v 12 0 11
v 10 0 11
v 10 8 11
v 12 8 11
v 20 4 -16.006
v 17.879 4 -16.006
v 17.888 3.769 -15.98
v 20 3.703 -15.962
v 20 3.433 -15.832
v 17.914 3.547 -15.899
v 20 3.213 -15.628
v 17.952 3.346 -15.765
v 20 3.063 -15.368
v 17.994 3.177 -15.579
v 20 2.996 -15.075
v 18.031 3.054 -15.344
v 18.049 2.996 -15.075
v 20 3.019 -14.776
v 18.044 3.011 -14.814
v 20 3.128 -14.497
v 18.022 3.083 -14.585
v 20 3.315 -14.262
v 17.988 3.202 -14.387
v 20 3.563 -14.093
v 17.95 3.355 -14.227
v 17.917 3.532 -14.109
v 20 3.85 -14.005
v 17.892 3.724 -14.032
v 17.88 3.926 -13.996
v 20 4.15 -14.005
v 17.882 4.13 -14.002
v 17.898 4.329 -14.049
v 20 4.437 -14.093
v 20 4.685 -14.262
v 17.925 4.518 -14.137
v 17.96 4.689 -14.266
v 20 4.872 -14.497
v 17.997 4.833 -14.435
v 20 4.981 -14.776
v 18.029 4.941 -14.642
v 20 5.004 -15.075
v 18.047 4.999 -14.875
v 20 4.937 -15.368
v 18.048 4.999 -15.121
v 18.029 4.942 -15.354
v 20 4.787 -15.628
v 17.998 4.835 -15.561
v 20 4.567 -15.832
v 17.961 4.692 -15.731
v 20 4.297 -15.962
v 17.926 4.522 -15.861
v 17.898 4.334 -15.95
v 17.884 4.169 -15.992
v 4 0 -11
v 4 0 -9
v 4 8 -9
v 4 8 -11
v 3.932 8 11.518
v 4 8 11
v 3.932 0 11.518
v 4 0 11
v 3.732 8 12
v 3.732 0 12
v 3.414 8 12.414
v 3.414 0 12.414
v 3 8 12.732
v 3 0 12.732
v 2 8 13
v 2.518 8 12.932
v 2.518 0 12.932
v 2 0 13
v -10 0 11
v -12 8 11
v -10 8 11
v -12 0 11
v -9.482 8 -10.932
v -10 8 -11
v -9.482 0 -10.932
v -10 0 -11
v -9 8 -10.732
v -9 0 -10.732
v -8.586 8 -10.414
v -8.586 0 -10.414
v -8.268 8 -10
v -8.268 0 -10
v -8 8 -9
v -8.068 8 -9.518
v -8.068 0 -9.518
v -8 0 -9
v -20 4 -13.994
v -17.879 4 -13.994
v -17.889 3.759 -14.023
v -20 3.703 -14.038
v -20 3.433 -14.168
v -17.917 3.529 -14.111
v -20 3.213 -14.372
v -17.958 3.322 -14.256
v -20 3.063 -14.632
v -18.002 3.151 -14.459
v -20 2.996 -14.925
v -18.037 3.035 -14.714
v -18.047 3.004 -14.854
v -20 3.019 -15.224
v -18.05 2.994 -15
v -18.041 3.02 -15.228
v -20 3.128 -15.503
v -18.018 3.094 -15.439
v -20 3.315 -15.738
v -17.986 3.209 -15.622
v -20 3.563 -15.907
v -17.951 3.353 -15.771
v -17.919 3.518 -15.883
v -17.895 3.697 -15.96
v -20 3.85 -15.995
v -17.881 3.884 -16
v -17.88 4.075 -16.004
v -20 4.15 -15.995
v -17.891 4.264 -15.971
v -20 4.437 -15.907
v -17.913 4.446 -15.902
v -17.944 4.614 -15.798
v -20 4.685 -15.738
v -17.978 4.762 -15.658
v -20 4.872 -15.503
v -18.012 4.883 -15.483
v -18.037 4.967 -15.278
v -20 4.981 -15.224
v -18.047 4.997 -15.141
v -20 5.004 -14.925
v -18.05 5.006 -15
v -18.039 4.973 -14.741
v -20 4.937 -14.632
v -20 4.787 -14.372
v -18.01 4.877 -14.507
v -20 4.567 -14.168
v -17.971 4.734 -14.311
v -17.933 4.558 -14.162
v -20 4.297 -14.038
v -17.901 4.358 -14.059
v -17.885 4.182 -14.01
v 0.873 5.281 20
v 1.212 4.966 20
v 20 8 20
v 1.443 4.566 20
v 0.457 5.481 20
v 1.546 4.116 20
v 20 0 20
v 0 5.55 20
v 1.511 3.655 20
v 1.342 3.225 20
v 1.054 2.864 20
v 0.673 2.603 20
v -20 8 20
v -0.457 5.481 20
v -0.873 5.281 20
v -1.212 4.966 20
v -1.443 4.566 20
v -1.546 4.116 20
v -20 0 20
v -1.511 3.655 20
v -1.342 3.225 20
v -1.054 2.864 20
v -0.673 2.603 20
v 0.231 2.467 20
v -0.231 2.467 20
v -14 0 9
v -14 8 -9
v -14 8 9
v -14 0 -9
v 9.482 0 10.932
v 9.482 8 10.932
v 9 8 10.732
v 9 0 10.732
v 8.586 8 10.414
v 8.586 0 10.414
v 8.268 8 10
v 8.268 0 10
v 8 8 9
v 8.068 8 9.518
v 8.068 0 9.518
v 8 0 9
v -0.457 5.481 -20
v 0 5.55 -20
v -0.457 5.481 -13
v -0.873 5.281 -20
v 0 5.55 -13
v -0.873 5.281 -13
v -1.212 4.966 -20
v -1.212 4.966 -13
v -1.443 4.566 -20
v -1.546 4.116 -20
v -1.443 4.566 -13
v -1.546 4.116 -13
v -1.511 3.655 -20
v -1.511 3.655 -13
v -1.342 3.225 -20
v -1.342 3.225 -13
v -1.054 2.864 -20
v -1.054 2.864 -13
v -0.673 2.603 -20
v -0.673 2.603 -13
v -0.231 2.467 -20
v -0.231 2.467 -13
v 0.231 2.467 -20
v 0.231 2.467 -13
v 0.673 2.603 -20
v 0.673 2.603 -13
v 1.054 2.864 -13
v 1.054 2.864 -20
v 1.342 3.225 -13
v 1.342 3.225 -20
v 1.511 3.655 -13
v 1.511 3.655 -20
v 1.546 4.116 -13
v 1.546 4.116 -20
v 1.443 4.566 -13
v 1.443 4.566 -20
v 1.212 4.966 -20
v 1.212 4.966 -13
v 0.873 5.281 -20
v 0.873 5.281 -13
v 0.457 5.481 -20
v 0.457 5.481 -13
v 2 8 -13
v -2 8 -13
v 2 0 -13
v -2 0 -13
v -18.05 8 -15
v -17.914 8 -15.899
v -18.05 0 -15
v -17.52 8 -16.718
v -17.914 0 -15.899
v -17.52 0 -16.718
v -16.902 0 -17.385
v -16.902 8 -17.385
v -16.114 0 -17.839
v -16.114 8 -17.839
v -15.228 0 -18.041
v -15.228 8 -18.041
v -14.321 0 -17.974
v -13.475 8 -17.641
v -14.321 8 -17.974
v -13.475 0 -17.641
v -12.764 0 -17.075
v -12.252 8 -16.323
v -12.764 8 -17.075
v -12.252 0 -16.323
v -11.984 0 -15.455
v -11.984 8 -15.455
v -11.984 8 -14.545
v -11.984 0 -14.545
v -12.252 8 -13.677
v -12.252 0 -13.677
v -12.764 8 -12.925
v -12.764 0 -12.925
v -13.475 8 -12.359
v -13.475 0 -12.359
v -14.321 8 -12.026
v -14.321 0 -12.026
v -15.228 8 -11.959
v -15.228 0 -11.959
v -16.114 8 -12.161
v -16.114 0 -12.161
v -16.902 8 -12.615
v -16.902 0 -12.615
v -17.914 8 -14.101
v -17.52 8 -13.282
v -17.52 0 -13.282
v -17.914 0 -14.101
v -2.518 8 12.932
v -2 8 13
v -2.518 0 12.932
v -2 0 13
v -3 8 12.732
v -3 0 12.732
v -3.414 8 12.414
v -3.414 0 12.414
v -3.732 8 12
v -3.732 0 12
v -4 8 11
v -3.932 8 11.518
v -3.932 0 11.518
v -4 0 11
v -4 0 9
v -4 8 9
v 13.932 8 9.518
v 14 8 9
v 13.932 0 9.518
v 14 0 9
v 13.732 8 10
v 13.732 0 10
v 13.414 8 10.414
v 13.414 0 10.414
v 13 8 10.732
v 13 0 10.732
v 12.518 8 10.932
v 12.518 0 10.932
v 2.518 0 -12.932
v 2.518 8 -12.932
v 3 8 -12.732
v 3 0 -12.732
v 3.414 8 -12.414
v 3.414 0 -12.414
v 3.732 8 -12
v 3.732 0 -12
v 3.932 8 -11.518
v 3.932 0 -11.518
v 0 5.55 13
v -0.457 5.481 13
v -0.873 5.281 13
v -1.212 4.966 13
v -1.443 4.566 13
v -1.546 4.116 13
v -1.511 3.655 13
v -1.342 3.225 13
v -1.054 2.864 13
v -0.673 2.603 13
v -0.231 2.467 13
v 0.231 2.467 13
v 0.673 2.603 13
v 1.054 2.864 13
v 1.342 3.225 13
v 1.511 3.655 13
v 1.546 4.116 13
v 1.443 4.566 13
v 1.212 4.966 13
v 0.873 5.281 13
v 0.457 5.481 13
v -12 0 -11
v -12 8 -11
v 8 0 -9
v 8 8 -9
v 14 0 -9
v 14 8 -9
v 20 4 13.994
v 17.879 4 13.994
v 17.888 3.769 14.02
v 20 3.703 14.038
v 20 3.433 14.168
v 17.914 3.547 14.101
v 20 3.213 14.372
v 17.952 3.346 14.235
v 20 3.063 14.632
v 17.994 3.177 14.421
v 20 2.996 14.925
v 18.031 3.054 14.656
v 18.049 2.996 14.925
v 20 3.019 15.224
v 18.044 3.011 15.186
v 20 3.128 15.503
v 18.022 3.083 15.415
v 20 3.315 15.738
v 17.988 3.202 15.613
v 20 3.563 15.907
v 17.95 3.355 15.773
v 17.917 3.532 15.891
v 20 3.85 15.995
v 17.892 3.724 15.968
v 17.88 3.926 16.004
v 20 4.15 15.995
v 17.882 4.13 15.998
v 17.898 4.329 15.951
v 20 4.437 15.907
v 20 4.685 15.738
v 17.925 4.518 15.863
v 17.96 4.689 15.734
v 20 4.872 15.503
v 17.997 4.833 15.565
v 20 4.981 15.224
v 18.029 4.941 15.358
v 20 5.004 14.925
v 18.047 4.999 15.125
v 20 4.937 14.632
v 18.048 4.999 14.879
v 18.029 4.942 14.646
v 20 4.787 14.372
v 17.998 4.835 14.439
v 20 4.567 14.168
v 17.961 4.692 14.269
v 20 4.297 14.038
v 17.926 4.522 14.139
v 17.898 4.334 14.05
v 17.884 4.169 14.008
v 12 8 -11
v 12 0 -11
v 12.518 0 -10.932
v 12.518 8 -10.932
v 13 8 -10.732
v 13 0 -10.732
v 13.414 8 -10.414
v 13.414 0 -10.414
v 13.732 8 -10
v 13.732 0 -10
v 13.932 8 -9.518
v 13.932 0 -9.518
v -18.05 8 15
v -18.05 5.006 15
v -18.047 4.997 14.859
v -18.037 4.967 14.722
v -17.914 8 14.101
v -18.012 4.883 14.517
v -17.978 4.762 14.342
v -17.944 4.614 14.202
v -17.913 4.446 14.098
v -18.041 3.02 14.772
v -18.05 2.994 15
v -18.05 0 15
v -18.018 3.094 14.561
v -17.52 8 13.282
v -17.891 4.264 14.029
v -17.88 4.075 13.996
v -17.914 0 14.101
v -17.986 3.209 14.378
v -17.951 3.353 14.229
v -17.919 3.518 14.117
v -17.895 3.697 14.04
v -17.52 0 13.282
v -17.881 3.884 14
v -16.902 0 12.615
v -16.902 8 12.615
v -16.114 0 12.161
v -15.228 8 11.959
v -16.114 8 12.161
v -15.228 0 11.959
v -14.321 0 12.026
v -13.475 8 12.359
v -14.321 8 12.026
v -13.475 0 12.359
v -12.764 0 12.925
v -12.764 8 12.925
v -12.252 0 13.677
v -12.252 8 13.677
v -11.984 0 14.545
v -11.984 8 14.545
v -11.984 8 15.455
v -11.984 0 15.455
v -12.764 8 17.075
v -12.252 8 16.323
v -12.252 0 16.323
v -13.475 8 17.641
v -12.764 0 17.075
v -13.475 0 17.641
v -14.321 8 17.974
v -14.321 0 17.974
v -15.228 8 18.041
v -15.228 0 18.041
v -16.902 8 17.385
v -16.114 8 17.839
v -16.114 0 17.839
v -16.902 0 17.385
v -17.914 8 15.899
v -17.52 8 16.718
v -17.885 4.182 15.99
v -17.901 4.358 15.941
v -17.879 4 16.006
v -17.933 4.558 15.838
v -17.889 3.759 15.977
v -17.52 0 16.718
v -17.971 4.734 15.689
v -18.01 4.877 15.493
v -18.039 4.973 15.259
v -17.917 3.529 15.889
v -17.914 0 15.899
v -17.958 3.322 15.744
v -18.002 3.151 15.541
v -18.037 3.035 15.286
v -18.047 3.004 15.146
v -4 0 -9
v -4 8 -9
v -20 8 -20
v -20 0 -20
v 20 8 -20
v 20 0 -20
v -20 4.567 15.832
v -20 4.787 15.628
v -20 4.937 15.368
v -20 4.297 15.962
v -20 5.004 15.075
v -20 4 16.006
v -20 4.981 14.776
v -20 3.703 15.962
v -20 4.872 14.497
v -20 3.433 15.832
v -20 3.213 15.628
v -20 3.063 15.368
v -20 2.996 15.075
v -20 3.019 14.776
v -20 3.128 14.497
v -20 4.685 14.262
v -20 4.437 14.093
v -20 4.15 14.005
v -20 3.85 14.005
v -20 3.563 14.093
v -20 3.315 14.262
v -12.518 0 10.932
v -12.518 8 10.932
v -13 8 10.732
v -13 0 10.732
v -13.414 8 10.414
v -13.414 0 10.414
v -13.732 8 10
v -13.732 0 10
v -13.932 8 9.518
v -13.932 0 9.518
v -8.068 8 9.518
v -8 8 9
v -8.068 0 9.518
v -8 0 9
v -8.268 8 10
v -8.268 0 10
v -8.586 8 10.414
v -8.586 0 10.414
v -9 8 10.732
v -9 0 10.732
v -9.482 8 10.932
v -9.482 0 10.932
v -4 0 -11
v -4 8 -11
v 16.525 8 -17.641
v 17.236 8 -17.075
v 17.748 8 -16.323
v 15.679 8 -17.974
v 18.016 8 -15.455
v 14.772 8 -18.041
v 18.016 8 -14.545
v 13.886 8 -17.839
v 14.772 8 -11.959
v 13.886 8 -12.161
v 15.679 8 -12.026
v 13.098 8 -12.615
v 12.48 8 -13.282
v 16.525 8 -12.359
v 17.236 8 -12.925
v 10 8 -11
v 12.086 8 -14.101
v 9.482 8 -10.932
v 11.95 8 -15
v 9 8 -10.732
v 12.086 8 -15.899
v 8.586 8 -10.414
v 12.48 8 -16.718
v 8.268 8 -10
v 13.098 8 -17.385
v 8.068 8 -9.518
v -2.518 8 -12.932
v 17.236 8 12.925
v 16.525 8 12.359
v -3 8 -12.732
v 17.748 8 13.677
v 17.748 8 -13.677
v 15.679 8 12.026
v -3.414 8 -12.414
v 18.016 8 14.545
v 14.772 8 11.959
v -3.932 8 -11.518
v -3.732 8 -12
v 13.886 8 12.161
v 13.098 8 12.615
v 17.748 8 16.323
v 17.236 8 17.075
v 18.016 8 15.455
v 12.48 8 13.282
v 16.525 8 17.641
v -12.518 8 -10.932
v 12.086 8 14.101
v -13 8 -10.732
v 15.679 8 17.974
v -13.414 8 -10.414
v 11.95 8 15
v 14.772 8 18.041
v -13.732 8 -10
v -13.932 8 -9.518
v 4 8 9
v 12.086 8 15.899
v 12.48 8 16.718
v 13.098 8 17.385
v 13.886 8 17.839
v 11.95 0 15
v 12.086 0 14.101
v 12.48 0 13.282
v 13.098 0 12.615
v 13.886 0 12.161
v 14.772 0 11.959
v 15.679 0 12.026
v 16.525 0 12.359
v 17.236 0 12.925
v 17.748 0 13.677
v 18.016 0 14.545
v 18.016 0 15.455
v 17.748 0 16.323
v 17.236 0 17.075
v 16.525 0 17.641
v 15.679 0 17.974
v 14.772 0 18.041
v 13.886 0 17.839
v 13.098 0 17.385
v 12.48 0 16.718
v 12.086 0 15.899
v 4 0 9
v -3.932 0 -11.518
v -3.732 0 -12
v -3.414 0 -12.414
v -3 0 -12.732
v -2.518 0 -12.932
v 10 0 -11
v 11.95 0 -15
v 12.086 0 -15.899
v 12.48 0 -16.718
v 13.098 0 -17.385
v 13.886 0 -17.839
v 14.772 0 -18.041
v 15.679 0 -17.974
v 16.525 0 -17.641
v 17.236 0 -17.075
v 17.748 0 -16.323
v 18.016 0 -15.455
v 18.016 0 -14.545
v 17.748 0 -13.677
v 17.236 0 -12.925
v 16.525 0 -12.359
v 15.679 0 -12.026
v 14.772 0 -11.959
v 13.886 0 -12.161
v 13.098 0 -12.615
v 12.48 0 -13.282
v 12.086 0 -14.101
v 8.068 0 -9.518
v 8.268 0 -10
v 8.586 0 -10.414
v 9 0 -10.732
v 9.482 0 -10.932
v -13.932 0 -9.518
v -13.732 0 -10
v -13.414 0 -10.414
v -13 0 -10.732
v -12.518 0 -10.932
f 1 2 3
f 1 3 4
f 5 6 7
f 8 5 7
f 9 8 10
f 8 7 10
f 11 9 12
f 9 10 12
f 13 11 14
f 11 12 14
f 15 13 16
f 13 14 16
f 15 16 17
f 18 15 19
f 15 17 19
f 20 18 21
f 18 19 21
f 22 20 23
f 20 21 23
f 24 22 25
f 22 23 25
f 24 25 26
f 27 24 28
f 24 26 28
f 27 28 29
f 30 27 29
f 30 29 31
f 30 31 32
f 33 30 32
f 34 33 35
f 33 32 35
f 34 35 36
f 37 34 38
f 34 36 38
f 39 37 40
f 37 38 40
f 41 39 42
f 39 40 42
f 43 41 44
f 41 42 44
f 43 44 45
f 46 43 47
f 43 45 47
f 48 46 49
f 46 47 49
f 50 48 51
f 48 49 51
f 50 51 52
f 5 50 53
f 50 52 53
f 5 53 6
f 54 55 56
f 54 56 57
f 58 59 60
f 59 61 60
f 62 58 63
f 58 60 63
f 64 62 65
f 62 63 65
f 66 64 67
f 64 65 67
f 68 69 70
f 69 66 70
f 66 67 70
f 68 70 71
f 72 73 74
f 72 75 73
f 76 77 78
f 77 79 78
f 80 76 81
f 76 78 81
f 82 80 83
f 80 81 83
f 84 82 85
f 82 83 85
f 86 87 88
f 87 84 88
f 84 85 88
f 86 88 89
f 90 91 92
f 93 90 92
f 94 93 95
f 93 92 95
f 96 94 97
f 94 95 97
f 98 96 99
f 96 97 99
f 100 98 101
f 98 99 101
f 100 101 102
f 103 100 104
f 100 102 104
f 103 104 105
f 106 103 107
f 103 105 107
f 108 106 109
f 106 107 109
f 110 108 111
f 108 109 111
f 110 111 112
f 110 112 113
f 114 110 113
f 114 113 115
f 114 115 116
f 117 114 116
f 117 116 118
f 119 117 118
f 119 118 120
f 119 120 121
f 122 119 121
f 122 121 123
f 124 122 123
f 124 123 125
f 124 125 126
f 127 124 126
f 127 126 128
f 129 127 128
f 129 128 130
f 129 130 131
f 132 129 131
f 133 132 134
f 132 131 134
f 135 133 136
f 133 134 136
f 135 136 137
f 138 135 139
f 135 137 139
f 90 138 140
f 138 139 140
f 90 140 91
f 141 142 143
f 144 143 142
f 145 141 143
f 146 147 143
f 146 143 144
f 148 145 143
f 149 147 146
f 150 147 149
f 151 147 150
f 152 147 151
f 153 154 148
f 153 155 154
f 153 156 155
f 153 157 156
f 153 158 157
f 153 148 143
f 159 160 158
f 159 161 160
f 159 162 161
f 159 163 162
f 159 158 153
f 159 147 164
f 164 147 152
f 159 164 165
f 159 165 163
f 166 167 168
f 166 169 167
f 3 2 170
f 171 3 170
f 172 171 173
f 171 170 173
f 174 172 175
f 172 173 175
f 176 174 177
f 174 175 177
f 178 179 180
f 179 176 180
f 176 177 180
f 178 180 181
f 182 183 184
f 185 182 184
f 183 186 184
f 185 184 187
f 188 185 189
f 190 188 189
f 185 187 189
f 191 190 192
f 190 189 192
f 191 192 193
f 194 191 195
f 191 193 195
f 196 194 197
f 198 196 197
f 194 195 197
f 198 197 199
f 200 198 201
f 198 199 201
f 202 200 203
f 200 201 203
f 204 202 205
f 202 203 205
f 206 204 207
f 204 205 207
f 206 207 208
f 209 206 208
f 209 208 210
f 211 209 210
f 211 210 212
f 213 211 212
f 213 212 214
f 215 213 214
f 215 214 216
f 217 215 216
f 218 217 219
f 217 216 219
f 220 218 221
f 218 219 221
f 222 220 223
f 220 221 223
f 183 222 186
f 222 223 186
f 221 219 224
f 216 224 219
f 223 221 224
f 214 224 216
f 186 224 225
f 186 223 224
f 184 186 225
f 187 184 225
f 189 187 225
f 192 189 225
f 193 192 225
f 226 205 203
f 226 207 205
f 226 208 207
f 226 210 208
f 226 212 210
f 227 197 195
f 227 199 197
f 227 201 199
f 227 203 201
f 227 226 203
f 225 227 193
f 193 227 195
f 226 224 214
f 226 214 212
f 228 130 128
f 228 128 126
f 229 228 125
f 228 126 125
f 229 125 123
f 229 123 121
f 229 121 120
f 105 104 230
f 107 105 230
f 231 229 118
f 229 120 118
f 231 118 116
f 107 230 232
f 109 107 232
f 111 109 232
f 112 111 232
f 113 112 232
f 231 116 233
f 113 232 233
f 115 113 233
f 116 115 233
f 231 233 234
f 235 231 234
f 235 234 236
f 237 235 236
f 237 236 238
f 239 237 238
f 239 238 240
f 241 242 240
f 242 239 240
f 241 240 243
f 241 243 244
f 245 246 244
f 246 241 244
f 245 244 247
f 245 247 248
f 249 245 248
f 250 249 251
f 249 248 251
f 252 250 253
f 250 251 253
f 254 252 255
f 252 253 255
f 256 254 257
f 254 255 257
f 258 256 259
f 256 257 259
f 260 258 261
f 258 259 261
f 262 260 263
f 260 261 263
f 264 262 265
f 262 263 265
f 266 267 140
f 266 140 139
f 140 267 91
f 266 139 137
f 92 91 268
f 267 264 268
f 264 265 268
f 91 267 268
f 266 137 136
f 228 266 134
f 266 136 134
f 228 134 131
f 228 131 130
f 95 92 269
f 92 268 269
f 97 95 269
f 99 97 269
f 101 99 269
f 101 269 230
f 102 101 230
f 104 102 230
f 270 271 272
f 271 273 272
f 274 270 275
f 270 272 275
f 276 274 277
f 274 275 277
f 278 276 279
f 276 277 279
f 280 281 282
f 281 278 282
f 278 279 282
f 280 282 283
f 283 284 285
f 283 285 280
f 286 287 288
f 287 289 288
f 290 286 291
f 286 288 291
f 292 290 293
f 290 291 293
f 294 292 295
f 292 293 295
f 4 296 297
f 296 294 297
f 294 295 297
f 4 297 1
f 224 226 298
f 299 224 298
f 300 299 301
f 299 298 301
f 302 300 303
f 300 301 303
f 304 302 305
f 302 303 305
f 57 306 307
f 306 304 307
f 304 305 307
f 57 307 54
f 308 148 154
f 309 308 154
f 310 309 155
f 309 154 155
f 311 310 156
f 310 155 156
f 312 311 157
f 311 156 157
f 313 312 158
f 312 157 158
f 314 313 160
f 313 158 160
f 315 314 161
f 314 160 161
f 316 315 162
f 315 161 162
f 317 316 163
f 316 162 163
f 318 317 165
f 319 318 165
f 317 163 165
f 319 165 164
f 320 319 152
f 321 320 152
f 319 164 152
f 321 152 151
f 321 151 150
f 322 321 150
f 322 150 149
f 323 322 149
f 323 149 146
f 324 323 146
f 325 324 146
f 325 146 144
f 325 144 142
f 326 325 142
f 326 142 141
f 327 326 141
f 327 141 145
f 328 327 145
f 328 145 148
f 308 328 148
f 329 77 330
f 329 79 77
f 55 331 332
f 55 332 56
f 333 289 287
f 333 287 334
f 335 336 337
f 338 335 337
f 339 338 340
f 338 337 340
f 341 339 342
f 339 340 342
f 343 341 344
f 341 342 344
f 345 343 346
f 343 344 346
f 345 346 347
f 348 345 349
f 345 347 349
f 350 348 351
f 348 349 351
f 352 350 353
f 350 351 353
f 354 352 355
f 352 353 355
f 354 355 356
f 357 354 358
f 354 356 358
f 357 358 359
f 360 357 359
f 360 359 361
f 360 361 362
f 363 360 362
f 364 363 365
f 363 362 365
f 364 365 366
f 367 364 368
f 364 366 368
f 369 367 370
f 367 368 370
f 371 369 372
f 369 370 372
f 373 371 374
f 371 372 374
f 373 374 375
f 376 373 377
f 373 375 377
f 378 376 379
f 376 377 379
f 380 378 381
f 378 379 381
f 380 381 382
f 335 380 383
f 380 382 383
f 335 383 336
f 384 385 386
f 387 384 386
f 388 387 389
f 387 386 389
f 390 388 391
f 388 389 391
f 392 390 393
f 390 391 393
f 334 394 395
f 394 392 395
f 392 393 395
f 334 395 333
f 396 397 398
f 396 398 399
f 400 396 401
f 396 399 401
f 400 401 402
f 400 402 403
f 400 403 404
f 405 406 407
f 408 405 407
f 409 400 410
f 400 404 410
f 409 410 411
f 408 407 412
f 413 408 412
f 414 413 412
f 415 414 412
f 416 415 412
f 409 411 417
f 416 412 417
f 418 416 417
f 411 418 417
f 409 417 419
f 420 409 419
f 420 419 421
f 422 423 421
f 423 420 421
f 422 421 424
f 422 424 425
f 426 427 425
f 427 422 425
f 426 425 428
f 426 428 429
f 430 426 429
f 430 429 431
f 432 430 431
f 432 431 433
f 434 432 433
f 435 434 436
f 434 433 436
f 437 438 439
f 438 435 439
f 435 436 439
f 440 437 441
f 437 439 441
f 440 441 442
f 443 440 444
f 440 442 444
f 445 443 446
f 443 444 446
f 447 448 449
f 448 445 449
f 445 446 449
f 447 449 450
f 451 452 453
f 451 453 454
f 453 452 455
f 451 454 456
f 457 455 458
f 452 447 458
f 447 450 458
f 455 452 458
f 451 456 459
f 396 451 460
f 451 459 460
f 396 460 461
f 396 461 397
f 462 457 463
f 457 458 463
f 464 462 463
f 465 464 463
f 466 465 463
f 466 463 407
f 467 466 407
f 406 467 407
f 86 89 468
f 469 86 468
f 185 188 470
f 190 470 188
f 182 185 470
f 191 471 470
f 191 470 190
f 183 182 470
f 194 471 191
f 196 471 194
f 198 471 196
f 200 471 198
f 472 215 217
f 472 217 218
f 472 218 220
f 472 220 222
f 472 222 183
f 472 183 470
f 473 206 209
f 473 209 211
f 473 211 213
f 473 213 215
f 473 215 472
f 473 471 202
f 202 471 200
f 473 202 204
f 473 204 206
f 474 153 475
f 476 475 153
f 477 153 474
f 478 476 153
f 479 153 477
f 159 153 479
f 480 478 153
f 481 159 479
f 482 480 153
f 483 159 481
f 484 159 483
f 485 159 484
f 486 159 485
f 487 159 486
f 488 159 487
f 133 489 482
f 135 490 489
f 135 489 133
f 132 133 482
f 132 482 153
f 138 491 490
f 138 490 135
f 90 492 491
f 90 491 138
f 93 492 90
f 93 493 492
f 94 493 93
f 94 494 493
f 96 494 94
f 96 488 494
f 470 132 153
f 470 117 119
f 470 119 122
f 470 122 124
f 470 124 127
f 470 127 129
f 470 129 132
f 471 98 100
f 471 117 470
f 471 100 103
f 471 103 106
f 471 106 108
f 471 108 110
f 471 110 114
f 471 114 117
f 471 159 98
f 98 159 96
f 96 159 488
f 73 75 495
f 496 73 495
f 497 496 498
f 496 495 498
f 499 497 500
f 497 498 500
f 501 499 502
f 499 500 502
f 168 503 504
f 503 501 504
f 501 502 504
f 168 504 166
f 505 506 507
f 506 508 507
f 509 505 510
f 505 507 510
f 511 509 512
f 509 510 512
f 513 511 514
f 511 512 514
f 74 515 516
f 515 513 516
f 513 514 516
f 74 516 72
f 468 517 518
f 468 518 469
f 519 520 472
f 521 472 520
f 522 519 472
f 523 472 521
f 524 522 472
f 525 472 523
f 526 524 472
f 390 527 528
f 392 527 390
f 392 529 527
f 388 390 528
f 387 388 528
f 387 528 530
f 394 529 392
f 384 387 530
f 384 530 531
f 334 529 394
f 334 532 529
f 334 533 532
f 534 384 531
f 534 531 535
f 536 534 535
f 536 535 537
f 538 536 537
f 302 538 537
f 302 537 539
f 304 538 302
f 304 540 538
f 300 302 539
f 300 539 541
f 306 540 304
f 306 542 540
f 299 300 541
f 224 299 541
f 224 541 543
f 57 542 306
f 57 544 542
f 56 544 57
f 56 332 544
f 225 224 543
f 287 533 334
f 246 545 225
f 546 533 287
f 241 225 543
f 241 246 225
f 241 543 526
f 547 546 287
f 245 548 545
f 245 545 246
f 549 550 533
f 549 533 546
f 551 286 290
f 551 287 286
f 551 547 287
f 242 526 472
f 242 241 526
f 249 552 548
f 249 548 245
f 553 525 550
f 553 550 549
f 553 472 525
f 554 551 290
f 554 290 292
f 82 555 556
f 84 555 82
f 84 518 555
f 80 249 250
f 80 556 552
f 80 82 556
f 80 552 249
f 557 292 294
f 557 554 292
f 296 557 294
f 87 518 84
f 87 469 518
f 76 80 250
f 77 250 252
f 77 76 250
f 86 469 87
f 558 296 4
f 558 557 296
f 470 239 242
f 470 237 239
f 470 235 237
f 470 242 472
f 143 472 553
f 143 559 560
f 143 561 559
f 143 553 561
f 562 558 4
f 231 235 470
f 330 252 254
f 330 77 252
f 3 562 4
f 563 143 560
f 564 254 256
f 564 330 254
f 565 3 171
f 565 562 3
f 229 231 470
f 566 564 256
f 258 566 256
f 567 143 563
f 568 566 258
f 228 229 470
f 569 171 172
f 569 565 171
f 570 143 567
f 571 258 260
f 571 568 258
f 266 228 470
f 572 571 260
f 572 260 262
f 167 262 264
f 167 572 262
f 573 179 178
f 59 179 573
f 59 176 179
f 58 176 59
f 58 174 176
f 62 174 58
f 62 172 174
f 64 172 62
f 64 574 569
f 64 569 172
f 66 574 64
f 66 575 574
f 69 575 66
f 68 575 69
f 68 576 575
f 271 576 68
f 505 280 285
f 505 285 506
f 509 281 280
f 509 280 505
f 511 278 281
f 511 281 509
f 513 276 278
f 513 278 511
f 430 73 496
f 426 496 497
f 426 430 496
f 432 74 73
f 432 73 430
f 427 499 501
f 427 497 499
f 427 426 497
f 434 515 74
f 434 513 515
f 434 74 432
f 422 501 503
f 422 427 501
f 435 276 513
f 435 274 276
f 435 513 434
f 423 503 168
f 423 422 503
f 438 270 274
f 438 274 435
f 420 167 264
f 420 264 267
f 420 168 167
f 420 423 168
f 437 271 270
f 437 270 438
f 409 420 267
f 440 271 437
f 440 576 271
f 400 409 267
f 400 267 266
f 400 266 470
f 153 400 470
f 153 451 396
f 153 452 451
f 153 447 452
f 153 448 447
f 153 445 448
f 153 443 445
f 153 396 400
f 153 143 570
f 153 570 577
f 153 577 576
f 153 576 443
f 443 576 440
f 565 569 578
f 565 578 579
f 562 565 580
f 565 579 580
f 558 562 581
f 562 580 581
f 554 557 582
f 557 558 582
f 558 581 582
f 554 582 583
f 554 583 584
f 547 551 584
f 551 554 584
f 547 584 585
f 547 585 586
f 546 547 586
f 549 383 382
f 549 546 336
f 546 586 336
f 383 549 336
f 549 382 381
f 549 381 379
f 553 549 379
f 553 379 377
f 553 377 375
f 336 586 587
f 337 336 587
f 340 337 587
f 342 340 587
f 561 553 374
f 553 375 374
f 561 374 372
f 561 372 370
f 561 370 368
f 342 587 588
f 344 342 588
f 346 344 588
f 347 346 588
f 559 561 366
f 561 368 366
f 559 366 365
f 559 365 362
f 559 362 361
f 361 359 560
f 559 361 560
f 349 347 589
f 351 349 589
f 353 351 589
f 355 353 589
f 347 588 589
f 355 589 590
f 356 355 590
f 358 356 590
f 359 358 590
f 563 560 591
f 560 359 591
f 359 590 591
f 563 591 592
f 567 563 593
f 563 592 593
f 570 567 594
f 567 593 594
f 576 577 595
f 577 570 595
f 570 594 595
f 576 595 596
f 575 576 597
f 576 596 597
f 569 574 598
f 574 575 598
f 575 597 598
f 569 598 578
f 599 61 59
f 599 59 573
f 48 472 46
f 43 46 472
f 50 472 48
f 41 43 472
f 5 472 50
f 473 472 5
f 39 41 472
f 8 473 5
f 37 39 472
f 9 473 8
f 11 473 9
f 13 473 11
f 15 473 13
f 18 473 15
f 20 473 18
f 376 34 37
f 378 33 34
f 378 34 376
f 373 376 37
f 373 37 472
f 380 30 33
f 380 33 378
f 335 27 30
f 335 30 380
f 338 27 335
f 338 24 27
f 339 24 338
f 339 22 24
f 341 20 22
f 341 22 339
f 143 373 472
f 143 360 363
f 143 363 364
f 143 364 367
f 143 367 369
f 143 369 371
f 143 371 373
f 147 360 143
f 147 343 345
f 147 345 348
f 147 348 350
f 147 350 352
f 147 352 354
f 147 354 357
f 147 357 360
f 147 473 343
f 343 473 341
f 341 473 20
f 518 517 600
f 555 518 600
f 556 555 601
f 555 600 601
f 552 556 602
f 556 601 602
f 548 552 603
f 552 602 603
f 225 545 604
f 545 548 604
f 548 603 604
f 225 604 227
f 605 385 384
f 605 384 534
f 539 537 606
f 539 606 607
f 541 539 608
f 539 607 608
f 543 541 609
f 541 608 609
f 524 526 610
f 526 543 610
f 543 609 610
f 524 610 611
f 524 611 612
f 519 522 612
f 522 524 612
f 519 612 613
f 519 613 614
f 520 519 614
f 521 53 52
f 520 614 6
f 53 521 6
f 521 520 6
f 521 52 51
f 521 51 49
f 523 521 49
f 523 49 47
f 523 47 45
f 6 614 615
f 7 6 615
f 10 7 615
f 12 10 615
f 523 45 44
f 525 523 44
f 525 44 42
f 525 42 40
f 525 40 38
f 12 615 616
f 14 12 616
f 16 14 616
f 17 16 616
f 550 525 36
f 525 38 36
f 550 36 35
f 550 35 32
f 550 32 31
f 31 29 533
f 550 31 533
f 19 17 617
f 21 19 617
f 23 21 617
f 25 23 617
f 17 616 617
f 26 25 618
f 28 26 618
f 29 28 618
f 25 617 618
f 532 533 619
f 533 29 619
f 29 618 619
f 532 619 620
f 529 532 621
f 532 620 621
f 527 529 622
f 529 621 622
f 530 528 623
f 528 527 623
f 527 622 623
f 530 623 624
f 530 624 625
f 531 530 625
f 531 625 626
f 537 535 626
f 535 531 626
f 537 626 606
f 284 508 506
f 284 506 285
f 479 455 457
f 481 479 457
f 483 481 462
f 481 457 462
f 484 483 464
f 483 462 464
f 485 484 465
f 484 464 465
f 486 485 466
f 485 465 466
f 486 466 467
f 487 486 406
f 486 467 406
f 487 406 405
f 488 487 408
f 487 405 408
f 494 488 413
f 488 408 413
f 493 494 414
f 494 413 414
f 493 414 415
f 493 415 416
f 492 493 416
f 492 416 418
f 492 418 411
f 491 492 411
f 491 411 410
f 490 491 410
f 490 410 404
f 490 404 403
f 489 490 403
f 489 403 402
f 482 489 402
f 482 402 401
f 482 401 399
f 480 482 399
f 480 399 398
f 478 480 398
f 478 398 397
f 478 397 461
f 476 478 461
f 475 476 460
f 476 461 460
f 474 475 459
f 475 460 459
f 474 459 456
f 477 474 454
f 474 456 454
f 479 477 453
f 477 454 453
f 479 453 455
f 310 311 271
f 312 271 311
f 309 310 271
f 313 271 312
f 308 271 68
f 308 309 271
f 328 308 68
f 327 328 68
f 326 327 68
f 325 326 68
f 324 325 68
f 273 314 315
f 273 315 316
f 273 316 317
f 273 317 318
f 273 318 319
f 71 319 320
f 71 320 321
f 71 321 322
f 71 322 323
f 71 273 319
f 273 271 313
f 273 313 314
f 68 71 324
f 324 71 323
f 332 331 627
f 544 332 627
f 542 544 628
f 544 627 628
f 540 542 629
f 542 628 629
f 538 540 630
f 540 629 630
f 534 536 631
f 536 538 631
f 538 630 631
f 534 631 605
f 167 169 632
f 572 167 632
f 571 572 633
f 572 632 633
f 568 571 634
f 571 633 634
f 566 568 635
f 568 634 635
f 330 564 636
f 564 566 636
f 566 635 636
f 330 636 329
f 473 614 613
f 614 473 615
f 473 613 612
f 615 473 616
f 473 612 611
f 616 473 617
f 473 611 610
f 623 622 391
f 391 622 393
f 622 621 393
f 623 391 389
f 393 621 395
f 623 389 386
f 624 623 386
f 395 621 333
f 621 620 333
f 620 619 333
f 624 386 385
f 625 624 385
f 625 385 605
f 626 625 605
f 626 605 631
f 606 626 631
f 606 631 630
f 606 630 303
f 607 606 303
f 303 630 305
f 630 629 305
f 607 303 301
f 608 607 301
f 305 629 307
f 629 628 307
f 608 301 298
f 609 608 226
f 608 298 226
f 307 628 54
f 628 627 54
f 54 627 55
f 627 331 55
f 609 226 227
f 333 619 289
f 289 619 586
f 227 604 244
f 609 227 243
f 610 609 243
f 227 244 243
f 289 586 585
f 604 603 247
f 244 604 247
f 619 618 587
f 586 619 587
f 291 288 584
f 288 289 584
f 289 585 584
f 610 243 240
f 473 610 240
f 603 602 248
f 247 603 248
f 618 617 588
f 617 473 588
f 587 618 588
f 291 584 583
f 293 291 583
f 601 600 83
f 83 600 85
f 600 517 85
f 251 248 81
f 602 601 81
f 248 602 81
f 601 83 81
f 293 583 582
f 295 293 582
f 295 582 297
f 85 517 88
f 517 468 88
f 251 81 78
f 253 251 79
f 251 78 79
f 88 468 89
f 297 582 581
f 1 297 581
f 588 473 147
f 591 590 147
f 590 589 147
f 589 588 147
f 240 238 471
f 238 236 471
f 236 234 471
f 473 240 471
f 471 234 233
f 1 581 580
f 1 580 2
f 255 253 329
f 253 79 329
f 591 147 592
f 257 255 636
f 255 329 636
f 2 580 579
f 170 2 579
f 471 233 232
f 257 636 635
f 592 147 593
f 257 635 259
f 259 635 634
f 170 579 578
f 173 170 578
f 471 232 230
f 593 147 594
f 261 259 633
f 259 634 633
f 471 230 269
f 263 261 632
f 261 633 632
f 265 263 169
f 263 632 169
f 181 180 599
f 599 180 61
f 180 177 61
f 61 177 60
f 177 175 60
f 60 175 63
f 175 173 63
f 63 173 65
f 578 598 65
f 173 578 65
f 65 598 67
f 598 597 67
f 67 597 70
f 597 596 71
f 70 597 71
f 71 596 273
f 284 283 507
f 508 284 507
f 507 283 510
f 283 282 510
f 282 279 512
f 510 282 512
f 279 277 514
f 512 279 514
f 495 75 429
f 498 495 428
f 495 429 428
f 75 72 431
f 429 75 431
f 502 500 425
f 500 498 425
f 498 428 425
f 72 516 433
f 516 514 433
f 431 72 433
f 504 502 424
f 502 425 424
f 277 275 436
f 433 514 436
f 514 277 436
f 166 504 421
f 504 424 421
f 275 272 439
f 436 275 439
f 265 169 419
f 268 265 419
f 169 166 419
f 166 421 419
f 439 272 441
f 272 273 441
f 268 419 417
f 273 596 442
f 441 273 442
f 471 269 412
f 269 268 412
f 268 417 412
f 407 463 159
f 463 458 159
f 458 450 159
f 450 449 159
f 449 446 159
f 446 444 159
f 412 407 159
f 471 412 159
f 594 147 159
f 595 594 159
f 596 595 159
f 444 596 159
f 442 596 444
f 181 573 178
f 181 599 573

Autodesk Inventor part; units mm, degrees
ref_plane "YZ Plane" through (0, 0, 0) normal (1, 0, 0) x (0, 1, 0)
ref_plane "XZ Plane" through (0, 0, 0) normal (0, 1, 0) x (-1, 0, 0)
ref_plane "XY Plane" through (0, 0, 0) normal (0, 0, 1) x (1, 0, 0)
sketch "Sketch1" plane through (0, 0, 0) normal (0, 1, 0) x (-1, 0, 0)
  line L0 (20, 20) -> (20, -20)
  line L1 (20, -20) -> (-20, -20)
  line L2 (-20, -20) -> (-20, 20)
  line L3 (-20, 20) -> (20, 20)
  line L4 (-15, 15) -> (-15, -15) construction
  line L5 (-15, -15) -> (15, -15) construction
  line L6 (15, -15) -> (15, 15) construction
  line L7 (15, 15) -> (-15, 15) construction
  circle A0 centre (15, 15) radius 3.05
  circle A1 centre (15, -15) radius 3.05
  circle A2 centre (-15, -15) radius 3.05
  circle A3 centre (-15, 15) radius 3.05
  line L8 (0, 0) -> (-18.5703, 0) construction
  line L9 (-8, 9) -> (-8, 9)
  line L10 (-10, 11) -> (-12, 11)
  line L11 (-14, 9) -> (-14, -9)
  line L12 (-12, -11) -> (-10, -11)
  line L13 (-8, -9) -> (-8, -9)
  line L14 (8, -9) -> (8, -9)
  line L15 (10, -11) -> (12, -11)
  line L16 (14, -9) -> (14, 9)
  line L17 (12, 11) -> (10, 11)
  line L18 (8, 9) -> (8, 9)
  line L19 (0, 0) -> (0, 18.05) construction
  line L20 (0, 0) -> (-18.05, 0) construction
  arc A4 (-12, 11) -> (-14, 9) centre (-12, 9) ccw
  arc A5 (-8, 9) -> (-10, 11) centre (-10, 9) ccw
  arc A6 (-10, -11) -> (-8, -9) centre (-10, -9) ccw
  arc A7 (-14, -9) -> (-12, -11) centre (-12, -9) ccw
  arc A8 (8, -9) -> (10, -11) centre (10, -9) ccw
  arc A9 (12, -11) -> (14, -9) centre (12, -9) ccw
  arc A10 (14, 9) -> (12, 11) centre (12, 9) ccw
  arc A11 (10, 11) -> (8, 9) centre (10, 9) ccw
  line L21 (8, 9) -> (4, 9)
  line L22 (4, 9) -> (4, 11)
  line L23 (2, 13) -> (-2, 13)
  line L24 (-4, 11) -> (-4, 9)
  line L25 (-4, 9) -> (-8, 9)
  line L26 (-8, -9) -> (-4, -9)
  line L27 (-4, -9) -> (-4, -11)
  line L28 (-2, -13) -> (2, -13)
  line L29 (4, -11) -> (4, -9)
  line L30 (8, -9) -> (4, -9)
  arc A12 (4, 11) -> (2, 13) centre (2, 11) ccw
  arc A13 (-2, 13) -> (-4, 11) centre (-2, 11) ccw
  arc A14 (2, -13) -> (4, -11) centre (2, -11) ccw
  arc A15 (-4, -11) -> (-2, -13) centre (-2, -11) ccw
  point P0 (-8, 11)
  point P1 (-14, 11)
  point P2 (-8, -11)
  point P3 (8, -11)
  point P4 (14, -11)
  point P5 (8, 11)
  point P6 (-4, 13)
  point P7 (-4, -13)
  point P8 (4, -13)
  dimension "d0" = 40
  dimension "d1" = 40
  dimension "d2" = 30
  dimension "d3" = 6.1
  dimension "d53" = 20
  dimension "d54" = 15
  dimension "d57" = 8
  dimension "d58" = 16
  dimension "d59" = 22
  dimension "d60" = 6
  dimension "d61" = 2
  dimension "d96" = 4
  dimension "d97" = 8
  dimension "d98" = 4
  dimension "d99" = 2
extrude "Extrusion5" add sketch "Sketch1" along normal blind 8
sketch "Sketch8" plane through (20, 0, -20) normal (0, 0, -1) x (-1, 0, 0)
  circle A0 centre (20, 4) radius 1.5
  point P0 (20, 0)
  dimension "d100" = 4
  dimension "d101" = 3
sketch "Sketch9" plane through (20, 0, 20) normal (1, 0, 0) x (0, 0, -1)
  line L0 (40, 0) -> (0, 0) projected
  line L1 (40, 0) -> (40, 8) projected
  line L2 (0, 8) -> (40, 8) projected
  line L3 (0, 0) -> (0, 8) projected
  point P0 (20, 0)
  point P1 (5, 4)
  point P2 (35, 4)
  dimension "d104" = 5
  dimension "d105" = 5
  dimension "d106" = 4
  dimension "d107" = 4
hole "Hole1" at (20, 4, 15) at (20, 4, -15) direction (-1, 0, 0) diameter 2.013 depth 5 tip angle 118 thread size "M2.5x0.45" class "6H" standard "ISO Metric profile"
sketch "Sketch10" plane through (-20, 0, -20) normal (-1, 0, 0) x (0, 0, 1)
  circle A0 centre (35, 4) radius 1.0065 projected
  circle A1 centre (5, 4) radius 1.0065 projected
  point P0 (20, 0)
  point P1 (33.9935, 4)
  point P2 (3.9935, 4)
hole "Hole2" at (-20, 4, 15) at (-20, 4, -15) direction (1, 0, 0) diameter 2.013 depth 5 tip angle 118 thread size "M2.5x0.45" class "6H" standard "ISO Metric profile"
hole "Hole3" at (0, 4, -20) direction (0, 0, 1) diameter 3.1 end through all
equation "\"d1\" = d0"
properties part number "Holder"
